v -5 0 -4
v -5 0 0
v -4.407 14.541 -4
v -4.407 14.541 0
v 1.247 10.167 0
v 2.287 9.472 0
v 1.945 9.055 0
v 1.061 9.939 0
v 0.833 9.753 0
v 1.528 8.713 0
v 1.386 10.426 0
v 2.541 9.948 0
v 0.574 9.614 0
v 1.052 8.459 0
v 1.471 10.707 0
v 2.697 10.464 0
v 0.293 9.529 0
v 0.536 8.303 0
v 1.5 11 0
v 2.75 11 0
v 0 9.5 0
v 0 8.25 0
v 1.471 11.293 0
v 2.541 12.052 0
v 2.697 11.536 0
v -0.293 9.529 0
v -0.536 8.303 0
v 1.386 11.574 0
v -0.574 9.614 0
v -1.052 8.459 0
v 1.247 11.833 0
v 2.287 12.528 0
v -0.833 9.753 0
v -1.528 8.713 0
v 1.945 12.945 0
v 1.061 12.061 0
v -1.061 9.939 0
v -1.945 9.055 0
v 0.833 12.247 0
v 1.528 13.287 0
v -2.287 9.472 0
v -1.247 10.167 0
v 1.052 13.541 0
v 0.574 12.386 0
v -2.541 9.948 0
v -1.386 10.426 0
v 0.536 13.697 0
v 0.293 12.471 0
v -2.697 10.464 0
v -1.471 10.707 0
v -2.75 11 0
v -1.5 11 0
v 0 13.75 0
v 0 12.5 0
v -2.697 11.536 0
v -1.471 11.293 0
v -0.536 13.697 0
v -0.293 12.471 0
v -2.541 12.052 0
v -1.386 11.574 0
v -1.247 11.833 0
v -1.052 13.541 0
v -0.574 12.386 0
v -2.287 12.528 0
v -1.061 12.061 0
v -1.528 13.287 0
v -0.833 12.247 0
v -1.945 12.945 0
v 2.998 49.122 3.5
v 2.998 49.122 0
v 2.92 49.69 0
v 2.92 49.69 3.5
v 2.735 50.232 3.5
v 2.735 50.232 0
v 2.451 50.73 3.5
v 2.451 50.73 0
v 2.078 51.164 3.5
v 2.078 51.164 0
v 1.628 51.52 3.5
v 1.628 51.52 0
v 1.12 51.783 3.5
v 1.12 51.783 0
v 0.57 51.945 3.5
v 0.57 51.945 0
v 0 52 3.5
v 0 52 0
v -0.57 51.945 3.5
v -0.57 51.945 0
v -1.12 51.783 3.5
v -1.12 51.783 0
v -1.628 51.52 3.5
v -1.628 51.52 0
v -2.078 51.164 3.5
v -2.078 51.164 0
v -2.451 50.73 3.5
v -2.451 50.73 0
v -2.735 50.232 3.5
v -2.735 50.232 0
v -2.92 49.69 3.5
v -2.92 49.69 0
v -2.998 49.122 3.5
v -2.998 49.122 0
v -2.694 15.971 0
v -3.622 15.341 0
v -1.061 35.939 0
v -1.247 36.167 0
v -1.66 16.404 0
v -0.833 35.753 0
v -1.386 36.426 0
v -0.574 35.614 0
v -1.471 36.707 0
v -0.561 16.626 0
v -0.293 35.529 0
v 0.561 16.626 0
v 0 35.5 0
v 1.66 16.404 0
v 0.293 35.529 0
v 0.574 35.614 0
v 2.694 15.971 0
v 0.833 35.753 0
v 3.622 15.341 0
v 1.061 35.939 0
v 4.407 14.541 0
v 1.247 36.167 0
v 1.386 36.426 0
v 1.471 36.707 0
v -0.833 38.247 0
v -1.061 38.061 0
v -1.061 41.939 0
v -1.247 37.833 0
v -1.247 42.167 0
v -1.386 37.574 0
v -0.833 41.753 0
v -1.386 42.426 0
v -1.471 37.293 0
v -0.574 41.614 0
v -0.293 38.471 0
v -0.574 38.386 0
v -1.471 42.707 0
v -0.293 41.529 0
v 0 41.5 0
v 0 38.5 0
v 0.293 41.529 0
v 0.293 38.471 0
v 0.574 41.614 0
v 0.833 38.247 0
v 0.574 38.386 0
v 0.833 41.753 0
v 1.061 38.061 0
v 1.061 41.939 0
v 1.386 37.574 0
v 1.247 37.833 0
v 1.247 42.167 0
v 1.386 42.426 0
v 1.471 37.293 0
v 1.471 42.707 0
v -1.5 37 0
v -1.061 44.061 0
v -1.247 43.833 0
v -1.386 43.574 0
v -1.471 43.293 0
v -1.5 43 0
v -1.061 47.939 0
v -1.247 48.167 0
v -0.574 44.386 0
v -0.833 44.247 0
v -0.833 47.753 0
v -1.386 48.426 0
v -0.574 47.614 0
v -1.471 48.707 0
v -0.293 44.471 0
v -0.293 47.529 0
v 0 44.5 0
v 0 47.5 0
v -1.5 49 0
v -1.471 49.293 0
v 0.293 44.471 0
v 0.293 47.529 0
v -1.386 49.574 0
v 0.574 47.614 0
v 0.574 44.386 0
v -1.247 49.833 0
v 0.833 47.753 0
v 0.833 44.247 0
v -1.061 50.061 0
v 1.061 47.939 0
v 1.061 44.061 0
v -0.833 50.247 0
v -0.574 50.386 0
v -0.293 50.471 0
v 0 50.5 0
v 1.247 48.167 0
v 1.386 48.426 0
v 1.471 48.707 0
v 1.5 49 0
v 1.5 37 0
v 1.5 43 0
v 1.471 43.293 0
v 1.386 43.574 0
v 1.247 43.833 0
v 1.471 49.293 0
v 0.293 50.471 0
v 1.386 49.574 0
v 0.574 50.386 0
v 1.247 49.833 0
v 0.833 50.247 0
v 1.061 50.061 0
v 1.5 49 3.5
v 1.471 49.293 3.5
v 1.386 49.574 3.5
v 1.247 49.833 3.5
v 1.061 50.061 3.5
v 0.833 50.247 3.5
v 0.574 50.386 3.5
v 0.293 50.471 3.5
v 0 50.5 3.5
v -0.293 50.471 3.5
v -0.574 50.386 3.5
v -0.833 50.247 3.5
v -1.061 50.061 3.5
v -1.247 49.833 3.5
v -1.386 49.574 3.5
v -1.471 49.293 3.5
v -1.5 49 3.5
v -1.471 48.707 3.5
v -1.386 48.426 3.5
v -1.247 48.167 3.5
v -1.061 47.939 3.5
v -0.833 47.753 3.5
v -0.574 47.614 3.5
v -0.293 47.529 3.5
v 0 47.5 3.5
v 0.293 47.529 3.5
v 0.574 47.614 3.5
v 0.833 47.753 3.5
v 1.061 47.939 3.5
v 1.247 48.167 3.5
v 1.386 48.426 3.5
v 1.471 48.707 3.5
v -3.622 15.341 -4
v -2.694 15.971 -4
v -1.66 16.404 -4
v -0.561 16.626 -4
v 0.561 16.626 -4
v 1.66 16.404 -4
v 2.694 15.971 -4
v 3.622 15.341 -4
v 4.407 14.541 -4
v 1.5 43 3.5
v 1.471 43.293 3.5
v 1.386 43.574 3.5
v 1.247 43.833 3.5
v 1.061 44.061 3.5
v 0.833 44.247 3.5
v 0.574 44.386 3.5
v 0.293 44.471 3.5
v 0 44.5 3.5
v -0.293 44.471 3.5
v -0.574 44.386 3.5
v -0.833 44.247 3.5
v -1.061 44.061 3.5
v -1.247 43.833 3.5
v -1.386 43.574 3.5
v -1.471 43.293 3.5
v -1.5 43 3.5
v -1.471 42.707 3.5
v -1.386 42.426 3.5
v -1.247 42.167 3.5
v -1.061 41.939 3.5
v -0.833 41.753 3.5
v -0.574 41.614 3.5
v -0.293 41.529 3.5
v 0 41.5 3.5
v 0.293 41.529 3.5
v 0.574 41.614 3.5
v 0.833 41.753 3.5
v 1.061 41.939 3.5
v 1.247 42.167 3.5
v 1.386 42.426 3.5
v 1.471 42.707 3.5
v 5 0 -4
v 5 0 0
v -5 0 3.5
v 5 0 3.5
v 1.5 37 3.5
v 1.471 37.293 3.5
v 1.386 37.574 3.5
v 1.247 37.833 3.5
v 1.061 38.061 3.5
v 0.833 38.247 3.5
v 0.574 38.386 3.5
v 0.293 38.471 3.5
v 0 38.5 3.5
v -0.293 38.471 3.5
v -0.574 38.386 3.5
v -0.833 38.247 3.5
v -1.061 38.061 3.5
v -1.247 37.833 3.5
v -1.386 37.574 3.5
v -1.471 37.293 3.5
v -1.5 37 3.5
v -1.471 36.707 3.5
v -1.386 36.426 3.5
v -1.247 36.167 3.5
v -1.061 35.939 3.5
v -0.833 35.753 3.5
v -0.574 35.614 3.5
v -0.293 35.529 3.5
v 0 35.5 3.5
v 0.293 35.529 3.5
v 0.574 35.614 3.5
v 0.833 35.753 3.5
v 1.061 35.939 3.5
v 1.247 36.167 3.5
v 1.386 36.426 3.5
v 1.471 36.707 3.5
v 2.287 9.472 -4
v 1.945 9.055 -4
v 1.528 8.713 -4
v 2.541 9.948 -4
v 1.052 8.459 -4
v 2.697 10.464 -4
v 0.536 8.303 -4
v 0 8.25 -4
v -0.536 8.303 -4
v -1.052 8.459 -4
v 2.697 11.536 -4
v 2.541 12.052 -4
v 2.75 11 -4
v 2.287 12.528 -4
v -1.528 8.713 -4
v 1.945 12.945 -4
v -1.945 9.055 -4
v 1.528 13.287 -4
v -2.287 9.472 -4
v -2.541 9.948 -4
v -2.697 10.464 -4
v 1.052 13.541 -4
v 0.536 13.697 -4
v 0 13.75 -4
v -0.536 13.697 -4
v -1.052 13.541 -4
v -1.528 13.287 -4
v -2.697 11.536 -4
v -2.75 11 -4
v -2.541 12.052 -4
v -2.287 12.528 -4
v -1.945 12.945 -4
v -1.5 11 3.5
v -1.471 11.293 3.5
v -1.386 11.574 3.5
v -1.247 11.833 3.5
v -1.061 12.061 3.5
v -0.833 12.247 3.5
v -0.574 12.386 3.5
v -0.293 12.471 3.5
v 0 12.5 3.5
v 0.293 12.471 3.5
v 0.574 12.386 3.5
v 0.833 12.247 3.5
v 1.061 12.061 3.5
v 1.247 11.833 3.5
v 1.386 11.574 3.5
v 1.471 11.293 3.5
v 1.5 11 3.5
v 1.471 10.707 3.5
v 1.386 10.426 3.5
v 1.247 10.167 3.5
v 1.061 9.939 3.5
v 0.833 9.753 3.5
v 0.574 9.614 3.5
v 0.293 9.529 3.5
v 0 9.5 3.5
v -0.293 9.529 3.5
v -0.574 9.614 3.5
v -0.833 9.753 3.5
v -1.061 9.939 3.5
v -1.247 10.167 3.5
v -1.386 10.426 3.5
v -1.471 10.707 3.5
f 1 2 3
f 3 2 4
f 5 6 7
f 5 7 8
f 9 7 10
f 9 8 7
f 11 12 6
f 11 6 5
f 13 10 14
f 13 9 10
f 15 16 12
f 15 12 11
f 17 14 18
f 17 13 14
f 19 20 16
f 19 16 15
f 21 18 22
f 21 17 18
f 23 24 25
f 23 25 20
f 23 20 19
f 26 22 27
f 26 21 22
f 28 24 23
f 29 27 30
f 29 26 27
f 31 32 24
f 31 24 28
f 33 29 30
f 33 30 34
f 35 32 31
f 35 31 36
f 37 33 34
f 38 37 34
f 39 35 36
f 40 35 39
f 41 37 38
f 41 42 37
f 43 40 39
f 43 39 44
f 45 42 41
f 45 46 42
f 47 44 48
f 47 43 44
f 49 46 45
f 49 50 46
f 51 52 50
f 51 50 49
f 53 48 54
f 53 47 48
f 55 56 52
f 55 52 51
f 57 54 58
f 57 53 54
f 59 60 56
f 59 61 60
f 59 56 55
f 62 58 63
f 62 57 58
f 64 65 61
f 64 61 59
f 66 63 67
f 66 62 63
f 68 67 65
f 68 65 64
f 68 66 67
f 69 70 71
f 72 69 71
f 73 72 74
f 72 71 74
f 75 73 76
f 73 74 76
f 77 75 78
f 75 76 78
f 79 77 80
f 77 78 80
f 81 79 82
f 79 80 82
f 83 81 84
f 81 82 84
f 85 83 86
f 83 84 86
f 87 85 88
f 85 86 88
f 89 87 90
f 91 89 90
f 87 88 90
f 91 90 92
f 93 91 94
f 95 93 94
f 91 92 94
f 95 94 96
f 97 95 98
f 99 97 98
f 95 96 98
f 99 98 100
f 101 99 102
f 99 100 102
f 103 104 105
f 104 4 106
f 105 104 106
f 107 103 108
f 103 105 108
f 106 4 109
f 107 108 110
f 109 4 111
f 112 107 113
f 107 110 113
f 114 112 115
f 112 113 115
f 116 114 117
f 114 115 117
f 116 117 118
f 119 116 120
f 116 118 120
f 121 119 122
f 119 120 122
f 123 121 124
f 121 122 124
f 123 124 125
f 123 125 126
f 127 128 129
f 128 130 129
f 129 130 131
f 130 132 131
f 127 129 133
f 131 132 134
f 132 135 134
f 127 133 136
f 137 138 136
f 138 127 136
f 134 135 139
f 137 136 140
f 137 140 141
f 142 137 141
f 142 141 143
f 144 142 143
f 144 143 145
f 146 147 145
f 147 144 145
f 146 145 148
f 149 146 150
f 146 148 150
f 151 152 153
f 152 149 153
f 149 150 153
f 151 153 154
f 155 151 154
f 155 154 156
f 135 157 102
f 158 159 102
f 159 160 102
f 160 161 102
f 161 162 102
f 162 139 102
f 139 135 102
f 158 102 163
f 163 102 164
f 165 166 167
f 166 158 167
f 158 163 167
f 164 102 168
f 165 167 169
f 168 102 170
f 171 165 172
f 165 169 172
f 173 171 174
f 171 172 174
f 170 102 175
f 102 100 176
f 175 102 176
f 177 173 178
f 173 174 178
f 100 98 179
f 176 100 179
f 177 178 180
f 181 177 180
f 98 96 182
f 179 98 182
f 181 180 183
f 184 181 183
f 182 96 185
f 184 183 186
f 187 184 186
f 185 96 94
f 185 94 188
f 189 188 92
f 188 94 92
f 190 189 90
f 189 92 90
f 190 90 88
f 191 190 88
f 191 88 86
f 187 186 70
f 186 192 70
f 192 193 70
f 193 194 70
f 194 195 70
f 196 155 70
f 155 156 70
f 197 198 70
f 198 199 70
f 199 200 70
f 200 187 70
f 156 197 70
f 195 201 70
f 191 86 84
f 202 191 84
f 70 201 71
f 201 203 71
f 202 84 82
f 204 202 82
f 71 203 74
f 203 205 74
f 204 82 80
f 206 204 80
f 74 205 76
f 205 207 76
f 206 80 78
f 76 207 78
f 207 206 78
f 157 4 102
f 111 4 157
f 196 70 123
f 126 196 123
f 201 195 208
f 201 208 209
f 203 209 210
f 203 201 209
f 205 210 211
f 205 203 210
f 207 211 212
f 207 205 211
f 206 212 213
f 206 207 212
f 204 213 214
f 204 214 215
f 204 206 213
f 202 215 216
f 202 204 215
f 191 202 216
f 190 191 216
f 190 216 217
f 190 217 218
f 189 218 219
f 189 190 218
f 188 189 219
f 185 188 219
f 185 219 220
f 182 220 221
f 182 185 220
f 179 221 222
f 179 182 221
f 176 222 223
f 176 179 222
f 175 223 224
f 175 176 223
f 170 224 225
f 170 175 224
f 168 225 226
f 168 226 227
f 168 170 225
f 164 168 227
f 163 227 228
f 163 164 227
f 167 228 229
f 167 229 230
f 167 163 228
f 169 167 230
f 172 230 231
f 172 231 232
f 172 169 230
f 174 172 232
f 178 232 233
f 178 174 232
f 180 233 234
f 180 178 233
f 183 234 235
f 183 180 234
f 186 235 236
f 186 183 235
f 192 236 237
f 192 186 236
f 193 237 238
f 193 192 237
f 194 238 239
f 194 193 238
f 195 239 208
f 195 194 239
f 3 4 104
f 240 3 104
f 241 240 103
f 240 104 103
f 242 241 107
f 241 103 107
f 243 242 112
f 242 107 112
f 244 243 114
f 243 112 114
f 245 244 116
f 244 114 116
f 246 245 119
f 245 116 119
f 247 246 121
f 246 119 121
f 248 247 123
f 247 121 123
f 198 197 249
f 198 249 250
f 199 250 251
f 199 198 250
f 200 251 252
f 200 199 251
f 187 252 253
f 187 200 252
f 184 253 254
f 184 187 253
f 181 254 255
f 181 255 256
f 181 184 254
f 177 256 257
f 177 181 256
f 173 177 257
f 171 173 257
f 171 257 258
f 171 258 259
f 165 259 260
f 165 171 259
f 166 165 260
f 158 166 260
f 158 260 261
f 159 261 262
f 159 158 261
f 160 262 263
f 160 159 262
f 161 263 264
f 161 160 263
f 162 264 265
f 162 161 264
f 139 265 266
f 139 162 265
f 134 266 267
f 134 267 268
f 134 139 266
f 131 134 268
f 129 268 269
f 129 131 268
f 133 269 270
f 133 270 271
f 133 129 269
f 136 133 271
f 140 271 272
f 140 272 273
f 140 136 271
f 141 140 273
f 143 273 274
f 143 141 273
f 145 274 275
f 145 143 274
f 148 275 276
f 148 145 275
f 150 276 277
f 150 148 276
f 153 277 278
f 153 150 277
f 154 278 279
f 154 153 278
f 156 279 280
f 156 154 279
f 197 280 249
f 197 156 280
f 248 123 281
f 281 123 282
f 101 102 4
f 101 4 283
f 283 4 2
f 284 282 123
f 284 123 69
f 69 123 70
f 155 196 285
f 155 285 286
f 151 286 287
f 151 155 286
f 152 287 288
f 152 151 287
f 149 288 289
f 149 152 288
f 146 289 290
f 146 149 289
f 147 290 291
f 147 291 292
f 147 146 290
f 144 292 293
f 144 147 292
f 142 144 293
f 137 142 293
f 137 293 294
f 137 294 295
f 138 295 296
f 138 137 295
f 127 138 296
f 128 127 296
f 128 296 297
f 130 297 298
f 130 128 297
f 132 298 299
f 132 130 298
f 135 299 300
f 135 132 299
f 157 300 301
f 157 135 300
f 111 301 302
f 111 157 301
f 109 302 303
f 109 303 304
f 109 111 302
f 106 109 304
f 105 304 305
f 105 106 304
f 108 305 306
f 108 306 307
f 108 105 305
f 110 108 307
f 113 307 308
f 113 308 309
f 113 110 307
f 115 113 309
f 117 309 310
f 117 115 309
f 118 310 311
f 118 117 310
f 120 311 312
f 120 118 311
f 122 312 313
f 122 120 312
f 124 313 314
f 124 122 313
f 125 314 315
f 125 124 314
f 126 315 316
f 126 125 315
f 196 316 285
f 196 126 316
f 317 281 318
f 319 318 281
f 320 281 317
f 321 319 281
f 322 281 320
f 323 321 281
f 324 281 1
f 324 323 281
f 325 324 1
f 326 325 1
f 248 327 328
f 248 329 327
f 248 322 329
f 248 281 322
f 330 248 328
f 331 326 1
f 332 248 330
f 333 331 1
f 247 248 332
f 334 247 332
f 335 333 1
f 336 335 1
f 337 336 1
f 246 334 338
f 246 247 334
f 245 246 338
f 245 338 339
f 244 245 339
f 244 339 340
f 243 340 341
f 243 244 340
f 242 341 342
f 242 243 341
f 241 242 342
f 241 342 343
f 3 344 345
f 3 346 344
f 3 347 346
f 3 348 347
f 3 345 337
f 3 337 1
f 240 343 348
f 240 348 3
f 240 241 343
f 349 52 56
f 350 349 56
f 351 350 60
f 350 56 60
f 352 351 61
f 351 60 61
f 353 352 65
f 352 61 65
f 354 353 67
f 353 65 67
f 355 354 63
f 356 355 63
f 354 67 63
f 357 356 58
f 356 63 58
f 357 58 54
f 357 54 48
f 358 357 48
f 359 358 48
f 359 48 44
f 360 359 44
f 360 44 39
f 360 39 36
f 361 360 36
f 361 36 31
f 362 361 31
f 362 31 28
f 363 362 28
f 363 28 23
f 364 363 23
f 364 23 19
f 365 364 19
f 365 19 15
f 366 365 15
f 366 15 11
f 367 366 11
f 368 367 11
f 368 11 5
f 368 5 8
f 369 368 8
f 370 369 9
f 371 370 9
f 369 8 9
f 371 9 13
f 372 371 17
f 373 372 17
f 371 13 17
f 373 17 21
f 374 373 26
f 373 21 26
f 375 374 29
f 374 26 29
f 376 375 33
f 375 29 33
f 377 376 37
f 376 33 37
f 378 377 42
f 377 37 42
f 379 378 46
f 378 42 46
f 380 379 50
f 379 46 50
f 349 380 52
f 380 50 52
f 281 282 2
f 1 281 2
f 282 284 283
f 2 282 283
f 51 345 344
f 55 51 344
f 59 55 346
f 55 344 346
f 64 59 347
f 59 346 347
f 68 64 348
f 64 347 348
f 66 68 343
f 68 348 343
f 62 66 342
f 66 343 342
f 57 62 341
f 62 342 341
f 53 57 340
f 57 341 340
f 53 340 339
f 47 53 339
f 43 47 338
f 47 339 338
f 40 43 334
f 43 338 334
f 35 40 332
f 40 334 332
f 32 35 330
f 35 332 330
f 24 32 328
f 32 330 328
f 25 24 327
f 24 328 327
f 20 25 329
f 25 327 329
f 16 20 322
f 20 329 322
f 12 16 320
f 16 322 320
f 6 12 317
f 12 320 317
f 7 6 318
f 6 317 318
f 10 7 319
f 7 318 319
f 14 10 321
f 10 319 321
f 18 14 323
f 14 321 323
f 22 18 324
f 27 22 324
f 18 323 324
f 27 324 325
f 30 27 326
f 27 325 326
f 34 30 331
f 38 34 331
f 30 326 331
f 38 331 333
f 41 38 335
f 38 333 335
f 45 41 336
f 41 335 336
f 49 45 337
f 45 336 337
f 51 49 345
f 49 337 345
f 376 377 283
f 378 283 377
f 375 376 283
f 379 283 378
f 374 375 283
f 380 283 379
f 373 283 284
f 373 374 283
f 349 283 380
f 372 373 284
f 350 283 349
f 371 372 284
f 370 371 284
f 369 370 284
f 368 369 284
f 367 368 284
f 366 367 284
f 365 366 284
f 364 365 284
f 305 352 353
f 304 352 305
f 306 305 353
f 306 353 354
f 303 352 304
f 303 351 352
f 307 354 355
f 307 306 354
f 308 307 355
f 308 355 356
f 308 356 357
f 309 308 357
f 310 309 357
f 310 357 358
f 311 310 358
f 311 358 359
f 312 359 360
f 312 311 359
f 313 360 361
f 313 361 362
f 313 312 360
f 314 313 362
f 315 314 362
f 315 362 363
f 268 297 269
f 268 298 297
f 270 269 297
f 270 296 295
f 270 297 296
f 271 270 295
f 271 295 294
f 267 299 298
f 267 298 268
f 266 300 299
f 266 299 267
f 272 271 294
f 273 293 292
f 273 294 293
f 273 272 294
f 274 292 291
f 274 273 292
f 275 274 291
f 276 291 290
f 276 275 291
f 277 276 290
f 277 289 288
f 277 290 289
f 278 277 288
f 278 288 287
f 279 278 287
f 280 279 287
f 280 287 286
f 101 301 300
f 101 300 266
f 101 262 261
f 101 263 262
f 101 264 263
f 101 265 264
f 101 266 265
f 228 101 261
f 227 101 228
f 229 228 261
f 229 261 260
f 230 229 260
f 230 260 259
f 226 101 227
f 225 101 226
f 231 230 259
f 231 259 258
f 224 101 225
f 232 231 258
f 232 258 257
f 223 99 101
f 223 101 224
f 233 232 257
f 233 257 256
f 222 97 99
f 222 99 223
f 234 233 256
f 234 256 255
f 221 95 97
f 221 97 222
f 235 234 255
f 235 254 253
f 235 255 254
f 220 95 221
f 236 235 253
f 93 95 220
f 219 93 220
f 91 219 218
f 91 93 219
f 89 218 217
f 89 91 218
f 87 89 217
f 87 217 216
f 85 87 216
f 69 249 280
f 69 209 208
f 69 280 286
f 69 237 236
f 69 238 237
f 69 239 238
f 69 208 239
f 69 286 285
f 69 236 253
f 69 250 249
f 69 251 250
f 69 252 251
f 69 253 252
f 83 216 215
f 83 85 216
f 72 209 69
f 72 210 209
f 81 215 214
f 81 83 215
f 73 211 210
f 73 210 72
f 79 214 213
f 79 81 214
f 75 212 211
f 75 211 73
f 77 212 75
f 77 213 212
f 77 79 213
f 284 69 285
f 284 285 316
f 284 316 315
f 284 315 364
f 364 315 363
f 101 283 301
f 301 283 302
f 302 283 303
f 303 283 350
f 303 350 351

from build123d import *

# Parameters (mm, degrees)
SKETCH_1_R          = 1.5
SKETCH_1_R_2        = 2.75
EXTRUDE_1_DEPTH     = 3.5
EXTRUDE_2_DEPTH     = 4
EXTRUDE_START       = -5
SKETCH_4_R          = 2.75
EXTRUDE_3_DEPTH     = 5
SKETCH_5_R          = 2.75
CUT_EXTRUDE_2_DEPTH = 4
SKETCH_6_R          = 1.5
CUT_EXTRUDE_3_DEPTH = 4


with BuildPart() as part:
    # 草图1 → 凸台-拉伸1 (new body)
    with BuildSketch(Plane.XY):
        with BuildLine():
            Line((-5, 0), (5, 0))
            Line((5, 0), (2.997510367, 49.122194935))
            ThreePointArc((2.997510367, 49.122194935), (0, 52), (-2.997510367, 49.122194935))
            Line((-2.997510367, 49.122194935), (-5, 0))
        make_face()
        with Locations((0, 49)):
            Circle(SKETCH_1_R, mode=Mode.SUBTRACT)
        with Locations((0, 43)):
            Circle(SKETCH_1_R, mode=Mode.SUBTRACT)
        with Locations((0, 37)):
            Circle(SKETCH_1_R, mode=Mode.SUBTRACT)
        with Locations((0, 11)):
            Circle(SKETCH_1_R_2, mode=Mode.SUBTRACT)
    extrude(amount=EXTRUDE_1_DEPTH)

    # 草图2 → 凸台-拉伸2 (add)
    with BuildSketch(Plane(origin=(0, 0, 0), x_dir=(-1, 0, 0), z_dir=(0, 0, -1))):
        with BuildLine():
            Line((5, 0), (4.407228658, 14.541013804))
            ThreePointArc((4.407228658, 14.541013804), (0, 16.653533692), (-4.407228658, 14.541013804))
            Line((-4.407228658, 14.541013804), (-5, 0))
            Line((-5, 0), (5, 0))
        make_face()
    extrude(amount=EXTRUDE_2_DEPTH)

    # 草图4 → 凸台-拉伸3 (add)
    with BuildSketch(Plane.XY.offset(3.5).offset(EXTRUDE_START)):
        with Locations((0, 11)):
            Circle(SKETCH_4_R)
    extrude(amount=EXTRUDE_3_DEPTH)

    # 草图5 → 切除-拉伸2 (cut)
    with BuildSketch(Plane(origin=(0, 0, -4), x_dir=(-1, 0, 0), z_dir=(0, 0, -1))):
        with Locations((0, 11)):
            Circle(SKETCH_5_R)
    extrude(amount=-CUT_EXTRUDE_2_DEPTH, mode=Mode.SUBTRACT)

    # 草图6 → 切除-拉伸3 (cut)
    with BuildSketch(Plane(origin=(0, 0, 0), x_dir=(-1, 0, 0), z_dir=(0, 0, -1))):
        with Locations((0, 11)):
            Circle(SKETCH_6_R)
    extrude(amount=-CUT_EXTRUDE_3_DEPTH, mode=Mode.SUBTRACT)


solid = part.part
